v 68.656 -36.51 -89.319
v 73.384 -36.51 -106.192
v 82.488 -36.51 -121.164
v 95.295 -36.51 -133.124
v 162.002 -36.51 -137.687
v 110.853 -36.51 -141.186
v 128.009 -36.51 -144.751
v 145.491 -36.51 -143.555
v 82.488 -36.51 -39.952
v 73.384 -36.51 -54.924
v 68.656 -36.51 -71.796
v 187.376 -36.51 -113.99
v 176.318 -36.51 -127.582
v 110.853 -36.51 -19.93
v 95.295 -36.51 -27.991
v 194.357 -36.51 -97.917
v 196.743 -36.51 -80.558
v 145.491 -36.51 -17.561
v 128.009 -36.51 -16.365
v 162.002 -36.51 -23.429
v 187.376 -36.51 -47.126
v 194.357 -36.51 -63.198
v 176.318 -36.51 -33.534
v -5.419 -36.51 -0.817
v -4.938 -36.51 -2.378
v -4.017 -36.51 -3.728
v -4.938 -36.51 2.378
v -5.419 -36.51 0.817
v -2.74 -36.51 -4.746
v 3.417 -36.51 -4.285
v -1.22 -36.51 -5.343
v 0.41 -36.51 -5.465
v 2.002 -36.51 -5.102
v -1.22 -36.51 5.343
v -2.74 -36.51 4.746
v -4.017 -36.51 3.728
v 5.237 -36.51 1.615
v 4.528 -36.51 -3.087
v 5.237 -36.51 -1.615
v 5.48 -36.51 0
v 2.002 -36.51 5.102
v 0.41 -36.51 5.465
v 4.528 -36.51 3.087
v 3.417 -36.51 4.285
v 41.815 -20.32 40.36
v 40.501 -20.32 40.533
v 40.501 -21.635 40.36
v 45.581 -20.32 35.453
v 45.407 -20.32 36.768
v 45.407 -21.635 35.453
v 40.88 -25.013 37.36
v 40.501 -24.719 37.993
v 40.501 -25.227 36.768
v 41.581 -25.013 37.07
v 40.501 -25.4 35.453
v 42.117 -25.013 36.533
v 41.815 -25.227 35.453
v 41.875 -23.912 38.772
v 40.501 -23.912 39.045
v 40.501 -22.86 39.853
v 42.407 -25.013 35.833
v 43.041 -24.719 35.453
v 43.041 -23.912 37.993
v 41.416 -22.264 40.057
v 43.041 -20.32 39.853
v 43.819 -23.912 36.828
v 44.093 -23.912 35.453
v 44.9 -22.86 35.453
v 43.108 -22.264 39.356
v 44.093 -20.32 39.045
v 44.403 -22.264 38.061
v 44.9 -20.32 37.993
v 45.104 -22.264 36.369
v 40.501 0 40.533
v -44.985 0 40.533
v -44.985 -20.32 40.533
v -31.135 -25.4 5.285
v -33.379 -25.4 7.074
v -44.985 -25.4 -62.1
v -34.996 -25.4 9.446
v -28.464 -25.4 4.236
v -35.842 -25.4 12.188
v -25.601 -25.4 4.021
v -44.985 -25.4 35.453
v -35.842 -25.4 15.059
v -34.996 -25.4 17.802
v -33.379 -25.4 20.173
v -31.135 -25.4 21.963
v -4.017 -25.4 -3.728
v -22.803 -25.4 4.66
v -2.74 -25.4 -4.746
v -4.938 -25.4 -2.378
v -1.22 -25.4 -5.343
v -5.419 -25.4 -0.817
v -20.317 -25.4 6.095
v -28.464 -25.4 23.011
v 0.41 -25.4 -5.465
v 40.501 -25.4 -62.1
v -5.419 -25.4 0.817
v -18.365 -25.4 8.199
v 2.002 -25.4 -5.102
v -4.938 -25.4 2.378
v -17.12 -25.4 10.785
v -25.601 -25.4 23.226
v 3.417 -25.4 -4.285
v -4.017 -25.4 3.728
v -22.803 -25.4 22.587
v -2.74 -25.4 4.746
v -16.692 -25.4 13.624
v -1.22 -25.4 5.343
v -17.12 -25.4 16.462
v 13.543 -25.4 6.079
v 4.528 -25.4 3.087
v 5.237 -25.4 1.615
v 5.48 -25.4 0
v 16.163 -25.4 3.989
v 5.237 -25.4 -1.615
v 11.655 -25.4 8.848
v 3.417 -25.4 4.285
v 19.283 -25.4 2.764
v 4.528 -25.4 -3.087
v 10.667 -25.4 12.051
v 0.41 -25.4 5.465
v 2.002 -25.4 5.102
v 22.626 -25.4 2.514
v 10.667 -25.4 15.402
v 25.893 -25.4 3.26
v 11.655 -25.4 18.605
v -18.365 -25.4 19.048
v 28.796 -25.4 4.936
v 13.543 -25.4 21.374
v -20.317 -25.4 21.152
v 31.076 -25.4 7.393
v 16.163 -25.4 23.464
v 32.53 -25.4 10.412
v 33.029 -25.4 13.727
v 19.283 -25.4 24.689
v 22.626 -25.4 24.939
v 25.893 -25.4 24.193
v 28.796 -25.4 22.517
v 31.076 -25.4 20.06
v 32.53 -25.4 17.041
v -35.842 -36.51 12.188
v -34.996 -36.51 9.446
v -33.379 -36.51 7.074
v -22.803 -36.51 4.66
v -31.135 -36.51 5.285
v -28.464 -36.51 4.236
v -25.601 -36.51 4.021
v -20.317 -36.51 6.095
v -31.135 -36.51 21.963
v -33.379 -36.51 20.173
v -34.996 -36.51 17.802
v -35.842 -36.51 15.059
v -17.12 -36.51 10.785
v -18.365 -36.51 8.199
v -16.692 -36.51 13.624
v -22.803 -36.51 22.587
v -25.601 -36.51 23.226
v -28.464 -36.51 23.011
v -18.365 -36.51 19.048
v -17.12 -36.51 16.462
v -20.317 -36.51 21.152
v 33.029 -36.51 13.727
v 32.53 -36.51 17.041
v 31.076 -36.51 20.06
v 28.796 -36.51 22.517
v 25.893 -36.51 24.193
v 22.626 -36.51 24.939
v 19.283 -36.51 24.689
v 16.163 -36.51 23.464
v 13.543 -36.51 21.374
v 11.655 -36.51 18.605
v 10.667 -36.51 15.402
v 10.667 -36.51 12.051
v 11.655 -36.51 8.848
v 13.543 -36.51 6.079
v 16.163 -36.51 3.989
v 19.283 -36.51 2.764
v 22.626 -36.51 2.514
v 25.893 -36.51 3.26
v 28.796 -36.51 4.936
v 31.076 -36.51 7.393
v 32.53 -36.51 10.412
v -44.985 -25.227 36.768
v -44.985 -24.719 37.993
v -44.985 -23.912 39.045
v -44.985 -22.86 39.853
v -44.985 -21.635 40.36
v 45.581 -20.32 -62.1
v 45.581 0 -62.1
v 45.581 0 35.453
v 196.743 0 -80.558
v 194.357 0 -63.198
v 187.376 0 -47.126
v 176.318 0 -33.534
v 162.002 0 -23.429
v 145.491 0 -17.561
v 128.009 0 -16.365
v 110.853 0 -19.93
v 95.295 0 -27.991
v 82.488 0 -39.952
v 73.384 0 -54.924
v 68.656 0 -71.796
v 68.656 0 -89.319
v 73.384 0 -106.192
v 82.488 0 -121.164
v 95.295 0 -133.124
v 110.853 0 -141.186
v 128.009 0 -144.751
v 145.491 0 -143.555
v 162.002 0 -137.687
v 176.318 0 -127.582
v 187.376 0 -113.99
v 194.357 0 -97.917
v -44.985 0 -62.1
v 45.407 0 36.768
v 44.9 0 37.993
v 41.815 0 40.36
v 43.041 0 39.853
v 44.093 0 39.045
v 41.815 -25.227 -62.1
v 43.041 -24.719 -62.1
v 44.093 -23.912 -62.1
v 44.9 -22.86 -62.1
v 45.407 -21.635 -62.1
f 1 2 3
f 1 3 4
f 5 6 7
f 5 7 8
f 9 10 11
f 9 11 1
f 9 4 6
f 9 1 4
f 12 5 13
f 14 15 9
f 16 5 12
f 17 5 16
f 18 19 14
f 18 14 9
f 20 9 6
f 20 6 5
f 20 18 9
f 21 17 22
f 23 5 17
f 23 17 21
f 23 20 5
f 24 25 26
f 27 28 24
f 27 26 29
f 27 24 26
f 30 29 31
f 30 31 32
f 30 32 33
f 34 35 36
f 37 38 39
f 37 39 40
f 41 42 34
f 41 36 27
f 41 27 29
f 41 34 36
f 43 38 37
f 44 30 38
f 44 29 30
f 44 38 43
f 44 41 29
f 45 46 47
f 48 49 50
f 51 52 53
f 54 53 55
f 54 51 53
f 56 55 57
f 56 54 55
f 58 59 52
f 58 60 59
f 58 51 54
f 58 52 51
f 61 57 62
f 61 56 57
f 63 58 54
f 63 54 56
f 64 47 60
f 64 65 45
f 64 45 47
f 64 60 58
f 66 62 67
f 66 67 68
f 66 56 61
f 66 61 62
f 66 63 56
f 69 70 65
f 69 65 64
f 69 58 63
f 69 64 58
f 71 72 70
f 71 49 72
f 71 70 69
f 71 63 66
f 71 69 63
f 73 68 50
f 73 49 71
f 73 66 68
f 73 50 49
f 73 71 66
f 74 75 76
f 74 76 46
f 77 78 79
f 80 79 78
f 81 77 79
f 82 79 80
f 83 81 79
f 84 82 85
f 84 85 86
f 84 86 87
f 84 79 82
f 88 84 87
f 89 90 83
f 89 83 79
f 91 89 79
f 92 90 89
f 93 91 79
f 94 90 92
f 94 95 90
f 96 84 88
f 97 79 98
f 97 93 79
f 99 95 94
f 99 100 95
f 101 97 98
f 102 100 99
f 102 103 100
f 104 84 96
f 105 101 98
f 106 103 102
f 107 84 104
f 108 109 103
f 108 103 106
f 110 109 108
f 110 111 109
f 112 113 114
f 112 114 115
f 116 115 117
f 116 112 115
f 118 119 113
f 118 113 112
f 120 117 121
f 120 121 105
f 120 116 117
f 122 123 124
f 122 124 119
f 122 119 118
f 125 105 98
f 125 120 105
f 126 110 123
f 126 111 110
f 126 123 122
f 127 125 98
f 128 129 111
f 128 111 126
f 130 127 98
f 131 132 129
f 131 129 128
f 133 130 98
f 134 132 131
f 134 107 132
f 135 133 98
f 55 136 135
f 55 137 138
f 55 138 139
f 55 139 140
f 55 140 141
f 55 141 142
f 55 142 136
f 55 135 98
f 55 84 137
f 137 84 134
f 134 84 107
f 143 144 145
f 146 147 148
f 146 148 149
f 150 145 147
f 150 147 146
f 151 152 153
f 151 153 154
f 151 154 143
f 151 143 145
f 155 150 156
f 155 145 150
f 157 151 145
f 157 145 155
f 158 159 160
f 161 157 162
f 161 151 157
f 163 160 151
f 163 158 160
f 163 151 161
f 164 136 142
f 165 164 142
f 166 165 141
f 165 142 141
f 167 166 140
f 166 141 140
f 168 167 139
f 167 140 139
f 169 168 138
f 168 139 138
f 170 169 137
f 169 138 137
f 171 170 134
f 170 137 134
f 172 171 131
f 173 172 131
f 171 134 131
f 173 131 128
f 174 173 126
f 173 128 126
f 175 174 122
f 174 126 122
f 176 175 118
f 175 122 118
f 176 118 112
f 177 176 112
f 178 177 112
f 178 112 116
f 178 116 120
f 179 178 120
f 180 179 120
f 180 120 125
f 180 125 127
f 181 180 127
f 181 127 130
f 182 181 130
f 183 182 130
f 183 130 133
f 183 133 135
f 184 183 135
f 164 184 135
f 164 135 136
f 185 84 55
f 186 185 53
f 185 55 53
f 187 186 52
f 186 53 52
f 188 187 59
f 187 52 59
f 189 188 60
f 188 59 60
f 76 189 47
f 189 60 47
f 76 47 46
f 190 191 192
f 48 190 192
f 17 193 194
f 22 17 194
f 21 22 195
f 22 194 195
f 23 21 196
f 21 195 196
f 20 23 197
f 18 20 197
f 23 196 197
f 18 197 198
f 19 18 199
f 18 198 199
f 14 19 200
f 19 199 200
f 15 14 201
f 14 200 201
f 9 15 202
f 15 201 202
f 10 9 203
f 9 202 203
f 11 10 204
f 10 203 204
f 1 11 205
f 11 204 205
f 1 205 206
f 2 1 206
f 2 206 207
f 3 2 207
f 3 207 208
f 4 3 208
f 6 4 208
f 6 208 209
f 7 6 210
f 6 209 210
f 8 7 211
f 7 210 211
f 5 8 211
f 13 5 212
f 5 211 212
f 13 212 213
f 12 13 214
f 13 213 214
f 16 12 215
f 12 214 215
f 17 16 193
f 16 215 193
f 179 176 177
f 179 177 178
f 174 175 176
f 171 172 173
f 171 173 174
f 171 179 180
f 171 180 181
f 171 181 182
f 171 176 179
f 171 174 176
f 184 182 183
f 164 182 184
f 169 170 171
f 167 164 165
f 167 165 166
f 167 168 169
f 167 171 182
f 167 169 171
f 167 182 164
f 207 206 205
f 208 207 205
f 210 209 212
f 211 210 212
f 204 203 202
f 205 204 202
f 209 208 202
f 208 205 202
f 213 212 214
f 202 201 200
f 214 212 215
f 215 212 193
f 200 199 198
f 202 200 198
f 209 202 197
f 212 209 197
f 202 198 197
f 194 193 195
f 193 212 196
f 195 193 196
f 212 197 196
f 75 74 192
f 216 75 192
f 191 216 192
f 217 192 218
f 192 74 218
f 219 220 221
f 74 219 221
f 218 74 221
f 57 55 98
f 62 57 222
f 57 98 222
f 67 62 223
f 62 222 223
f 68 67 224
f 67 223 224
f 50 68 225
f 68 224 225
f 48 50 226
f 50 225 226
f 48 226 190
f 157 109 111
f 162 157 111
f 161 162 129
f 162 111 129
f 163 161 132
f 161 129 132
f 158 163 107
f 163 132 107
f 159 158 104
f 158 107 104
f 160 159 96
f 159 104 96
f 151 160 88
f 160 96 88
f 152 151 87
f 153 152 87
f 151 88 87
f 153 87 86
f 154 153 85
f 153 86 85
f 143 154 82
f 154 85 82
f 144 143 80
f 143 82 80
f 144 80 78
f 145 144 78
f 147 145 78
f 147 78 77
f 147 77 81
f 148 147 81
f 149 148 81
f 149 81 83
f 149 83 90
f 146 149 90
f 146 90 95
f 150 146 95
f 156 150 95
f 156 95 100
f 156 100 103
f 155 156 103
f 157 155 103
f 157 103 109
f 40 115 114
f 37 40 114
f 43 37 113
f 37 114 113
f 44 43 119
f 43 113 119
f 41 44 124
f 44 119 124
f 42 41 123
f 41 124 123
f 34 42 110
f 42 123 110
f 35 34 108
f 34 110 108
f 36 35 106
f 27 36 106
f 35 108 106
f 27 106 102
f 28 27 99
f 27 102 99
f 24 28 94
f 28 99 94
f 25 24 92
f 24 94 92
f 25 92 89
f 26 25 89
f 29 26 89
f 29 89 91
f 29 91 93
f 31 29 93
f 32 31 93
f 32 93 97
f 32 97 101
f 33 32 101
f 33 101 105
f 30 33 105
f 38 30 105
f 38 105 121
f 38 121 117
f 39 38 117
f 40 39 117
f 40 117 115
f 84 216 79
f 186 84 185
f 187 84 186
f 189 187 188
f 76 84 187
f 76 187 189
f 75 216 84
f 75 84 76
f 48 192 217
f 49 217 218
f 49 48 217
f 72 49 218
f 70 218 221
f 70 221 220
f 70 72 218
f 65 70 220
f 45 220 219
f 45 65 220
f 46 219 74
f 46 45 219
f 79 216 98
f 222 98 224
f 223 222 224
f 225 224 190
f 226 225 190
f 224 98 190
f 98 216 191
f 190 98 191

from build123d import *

# Parameters (mm, degrees)
F0_W     = 90.565905
F0_H     = 102.633238
F1_DEPTH = 25.4
F2_R     = 5.08
F3_R     = 5.08
F4_R     = 9.629111
F4_R_2   = 11.243975
F4_R_3   = 5.480477
F4_R_4   = 64.343116
F5_DEPTH = 36.509717


with BuildPart() as f1:
    # F0 (on Front) → F1 (new body)
    with BuildSketch(Plane.XZ):
        with Locations((0.297628, -10.783225)):
            Rectangle(F0_W, F0_H)
    extrude(amount=F1_DEPTH)

    # F2
    f2_edges = [f1.edges().sort_by_distance(p)[0] for p in [
        (45.580581, -12.7, 40.533394),
    ]]
    fillet(f2_edges, radius=F2_R)

    # F3
    f3_edges = [f1.edges().sort_by_distance(p)[0] for p in [
        (-2.242372, -25.4, 40.533394),
    ]]
    fillet(f3_edges, radius=F3_R)

    # F4 (on Front) → F5 (join)
    with BuildSketch(Plane.XZ):
        with Locations((-26.320854, 13.623619)):
            Circle(F4_R)
        with Locations((21.785319, 13.726535)):
            Circle(F4_R_2)
        Circle(F4_R_3)
        with Locations((132.400155, -80.557875)):
            Circle(F4_R_4)
    extrude(amount=F5_DEPTH)


solid = f1.part
